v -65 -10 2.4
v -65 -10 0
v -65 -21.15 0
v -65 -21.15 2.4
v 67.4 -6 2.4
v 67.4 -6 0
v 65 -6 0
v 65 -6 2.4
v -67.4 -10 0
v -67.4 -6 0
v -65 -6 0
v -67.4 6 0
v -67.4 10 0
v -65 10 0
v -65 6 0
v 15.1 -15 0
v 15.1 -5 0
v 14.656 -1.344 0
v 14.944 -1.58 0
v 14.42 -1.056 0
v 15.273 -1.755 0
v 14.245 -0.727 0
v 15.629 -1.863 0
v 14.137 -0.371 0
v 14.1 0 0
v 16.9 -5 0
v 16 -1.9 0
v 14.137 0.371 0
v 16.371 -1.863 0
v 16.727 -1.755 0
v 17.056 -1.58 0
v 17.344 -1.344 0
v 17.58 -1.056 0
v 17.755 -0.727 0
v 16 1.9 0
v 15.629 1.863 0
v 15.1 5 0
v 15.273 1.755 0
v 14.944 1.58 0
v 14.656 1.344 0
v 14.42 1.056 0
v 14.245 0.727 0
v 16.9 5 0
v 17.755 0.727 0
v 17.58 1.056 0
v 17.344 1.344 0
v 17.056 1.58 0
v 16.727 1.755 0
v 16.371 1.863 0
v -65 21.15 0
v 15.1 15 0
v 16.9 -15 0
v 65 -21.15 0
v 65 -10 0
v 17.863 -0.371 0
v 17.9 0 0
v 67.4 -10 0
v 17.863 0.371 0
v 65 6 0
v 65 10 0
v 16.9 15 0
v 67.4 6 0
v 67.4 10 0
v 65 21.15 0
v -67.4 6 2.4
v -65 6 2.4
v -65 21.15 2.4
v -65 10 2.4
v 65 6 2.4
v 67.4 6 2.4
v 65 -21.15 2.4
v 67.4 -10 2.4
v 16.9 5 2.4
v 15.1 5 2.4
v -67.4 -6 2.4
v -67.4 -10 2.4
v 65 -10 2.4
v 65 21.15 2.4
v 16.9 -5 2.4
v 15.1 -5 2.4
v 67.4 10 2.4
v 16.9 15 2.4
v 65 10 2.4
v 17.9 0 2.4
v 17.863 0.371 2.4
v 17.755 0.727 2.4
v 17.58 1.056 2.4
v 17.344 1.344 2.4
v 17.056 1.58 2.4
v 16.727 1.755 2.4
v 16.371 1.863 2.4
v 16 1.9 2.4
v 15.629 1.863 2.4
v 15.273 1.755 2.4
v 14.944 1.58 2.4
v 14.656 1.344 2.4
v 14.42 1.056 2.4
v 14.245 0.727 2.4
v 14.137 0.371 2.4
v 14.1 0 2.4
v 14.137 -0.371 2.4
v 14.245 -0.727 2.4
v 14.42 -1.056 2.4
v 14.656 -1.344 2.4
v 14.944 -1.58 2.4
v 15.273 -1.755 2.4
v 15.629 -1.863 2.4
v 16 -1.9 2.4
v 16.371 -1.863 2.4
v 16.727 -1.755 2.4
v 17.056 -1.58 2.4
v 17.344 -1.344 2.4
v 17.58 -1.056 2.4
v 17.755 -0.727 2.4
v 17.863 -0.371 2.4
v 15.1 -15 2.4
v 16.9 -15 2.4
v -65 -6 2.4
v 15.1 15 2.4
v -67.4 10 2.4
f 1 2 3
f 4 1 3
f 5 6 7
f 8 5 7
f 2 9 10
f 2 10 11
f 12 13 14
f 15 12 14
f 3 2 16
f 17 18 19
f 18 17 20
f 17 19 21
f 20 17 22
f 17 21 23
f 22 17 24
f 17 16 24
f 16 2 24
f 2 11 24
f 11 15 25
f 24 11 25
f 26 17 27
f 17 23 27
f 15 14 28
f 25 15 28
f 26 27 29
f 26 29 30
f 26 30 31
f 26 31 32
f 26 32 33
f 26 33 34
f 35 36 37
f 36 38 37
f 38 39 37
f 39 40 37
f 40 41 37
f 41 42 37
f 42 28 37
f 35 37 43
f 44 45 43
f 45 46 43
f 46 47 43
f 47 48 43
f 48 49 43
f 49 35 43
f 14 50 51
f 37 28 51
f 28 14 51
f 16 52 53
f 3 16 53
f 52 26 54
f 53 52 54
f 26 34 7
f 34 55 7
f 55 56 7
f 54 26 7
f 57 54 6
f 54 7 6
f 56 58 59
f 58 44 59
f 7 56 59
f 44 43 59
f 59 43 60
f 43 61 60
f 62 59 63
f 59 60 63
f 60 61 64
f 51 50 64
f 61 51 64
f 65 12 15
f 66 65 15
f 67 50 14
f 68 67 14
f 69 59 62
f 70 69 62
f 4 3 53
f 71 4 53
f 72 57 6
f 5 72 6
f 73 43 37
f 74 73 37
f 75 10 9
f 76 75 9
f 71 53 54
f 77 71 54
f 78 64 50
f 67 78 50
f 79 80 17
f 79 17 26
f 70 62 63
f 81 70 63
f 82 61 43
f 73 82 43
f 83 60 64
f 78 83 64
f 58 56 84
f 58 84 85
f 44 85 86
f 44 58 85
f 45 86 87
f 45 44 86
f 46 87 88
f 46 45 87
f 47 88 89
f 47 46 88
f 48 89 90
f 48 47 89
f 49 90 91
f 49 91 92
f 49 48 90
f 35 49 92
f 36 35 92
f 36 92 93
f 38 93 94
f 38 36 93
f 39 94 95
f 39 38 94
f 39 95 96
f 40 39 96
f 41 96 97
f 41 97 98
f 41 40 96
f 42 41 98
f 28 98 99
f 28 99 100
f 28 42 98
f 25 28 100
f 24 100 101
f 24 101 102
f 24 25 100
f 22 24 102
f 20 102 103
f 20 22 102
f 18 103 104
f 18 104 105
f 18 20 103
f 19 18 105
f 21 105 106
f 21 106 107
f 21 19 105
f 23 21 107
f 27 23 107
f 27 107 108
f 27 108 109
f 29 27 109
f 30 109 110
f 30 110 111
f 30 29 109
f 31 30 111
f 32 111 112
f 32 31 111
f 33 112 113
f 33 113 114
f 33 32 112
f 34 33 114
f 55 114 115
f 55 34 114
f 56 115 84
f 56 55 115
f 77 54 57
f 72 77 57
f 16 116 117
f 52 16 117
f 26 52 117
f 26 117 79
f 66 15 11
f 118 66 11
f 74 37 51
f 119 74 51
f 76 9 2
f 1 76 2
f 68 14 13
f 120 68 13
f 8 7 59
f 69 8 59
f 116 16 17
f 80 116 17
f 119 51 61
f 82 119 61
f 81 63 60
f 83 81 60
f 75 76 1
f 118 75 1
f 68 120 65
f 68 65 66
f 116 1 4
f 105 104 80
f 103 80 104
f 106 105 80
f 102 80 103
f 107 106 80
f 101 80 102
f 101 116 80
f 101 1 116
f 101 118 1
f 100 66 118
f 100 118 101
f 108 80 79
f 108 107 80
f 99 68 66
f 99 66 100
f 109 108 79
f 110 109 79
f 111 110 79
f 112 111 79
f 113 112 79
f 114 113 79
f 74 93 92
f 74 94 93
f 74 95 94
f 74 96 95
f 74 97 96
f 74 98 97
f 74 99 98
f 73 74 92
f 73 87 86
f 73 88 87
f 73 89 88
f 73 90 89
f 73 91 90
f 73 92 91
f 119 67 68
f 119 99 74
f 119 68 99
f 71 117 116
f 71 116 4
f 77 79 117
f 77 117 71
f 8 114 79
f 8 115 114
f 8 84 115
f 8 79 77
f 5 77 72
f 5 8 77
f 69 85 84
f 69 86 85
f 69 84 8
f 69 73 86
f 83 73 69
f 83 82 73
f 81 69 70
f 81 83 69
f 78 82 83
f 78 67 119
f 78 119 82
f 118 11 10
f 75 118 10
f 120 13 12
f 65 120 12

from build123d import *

# Parameters (mm, degrees)
SKETCH1_W           = 1.8
SKETCH1_H           = 10
SKETCH1_R           = 1.9
BOSS_EXTRUDE1_DEPTH = 2.4


with BuildPart() as part:
    # Sketch1 → Boss-Extrude1 (new body)
    with BuildSketch(Plane.XY):
        Polygon((65, 21.15), (-65, 21.15), (-65, 10), (-67.4, 10), (-67.4, 6), (-65, 6), (-65, -6), (-67.4, -6), (-67.4, -10), (-65, -10), (-65, -21.15), (65, -21.15), (65, -10), (67.4, -10), (67.4, -6), (65, -6), (65, 6), (67.4, 6), (67.4, 10), (65, 10), align=None)
        with Locations((16, -10)):
            Rectangle(SKETCH1_W, SKETCH1_H, mode=Mode.SUBTRACT)
        with Locations((16, 0)):
            Circle(SKETCH1_R, mode=Mode.SUBTRACT)
        Polygon((16.9, 5), (16, 5), (15.1, 5), (15.1, 15), (16.9, 15), align=None, mode=Mode.SUBTRACT)
    extrude(amount=BOSS_EXTRUDE1_DEPTH)


solid = part.part
